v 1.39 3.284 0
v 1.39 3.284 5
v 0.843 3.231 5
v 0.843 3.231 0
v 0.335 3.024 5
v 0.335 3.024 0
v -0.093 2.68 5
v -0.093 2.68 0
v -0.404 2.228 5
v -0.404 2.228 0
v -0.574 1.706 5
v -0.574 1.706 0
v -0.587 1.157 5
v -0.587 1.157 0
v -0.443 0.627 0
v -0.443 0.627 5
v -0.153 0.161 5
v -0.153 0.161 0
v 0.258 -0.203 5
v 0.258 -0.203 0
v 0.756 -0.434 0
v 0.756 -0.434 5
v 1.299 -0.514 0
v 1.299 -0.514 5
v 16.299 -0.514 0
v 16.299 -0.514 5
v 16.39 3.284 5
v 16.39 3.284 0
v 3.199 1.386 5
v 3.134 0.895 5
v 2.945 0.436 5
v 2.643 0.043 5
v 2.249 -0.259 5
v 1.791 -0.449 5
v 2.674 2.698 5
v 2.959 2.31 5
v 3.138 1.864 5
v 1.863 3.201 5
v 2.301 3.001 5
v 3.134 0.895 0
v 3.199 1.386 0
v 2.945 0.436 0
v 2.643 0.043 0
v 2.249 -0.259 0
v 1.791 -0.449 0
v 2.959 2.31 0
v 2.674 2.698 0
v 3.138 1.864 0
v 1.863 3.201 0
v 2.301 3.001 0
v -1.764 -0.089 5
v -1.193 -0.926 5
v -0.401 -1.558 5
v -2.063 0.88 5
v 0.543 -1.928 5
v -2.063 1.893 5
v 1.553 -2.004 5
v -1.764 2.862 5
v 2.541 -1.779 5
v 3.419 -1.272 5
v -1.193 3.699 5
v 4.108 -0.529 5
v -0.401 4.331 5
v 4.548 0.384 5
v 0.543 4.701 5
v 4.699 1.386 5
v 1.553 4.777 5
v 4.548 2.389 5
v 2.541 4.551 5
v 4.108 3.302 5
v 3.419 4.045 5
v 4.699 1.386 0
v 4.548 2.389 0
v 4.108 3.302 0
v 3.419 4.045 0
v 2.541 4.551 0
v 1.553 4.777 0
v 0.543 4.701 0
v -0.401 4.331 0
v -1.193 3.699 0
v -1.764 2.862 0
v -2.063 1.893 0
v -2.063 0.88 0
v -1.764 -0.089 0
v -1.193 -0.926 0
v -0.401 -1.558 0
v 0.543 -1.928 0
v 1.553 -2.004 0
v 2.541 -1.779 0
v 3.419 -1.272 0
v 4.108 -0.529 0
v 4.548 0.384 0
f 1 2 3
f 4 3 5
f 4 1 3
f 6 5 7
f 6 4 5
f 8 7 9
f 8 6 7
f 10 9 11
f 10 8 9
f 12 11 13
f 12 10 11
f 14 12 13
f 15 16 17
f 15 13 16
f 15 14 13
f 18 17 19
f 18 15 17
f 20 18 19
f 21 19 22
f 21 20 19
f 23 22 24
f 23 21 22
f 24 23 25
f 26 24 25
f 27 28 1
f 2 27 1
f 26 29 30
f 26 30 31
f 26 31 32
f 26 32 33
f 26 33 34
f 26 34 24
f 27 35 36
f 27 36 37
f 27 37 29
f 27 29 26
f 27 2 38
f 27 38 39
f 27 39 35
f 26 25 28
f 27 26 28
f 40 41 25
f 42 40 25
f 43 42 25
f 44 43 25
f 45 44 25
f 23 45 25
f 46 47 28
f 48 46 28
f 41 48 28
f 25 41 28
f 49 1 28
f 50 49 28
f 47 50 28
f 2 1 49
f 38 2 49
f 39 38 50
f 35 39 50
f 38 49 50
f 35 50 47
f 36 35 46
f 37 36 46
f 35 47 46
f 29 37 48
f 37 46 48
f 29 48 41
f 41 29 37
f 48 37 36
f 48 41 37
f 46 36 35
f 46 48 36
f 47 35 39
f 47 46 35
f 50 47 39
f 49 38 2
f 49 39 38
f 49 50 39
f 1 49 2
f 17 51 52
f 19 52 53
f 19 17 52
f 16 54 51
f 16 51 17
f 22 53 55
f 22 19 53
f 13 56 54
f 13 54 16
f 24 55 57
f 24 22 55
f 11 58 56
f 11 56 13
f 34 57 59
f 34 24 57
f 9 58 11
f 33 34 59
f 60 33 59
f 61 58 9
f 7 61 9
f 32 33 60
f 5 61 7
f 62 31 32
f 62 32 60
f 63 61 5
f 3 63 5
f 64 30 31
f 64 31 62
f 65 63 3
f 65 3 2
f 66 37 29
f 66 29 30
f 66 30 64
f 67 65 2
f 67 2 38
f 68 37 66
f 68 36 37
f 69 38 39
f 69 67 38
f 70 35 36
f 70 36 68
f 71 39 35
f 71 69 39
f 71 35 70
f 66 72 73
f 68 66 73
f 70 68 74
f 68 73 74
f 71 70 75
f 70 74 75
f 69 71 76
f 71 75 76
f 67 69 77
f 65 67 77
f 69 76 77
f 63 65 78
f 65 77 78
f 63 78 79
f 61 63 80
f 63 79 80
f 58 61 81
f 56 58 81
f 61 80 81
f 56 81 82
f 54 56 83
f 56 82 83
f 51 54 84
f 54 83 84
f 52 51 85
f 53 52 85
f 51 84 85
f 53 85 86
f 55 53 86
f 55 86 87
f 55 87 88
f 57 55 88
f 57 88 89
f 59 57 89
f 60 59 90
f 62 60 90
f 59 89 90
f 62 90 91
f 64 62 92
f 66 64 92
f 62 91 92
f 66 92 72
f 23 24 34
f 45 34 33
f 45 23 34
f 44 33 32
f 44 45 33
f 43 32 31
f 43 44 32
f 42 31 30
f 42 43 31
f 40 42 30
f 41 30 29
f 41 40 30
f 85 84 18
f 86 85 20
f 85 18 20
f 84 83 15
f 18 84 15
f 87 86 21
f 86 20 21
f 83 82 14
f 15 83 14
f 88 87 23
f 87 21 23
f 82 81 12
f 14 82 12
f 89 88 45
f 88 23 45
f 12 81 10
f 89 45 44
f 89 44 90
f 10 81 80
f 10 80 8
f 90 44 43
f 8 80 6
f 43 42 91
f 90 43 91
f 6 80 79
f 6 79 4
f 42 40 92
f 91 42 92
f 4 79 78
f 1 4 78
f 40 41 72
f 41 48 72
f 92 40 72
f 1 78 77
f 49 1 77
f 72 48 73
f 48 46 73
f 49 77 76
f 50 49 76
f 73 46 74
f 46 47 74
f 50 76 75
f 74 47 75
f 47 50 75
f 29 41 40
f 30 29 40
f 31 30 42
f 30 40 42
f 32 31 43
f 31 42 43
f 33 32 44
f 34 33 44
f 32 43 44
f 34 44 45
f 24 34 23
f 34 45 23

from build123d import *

# Parameters (mm, degrees)
F1_R     = 3.4
F2_DEPTH = 5
F3_DEPTH = 25
F4_DEPTH = 5


with BuildPart() as f2:
    # F1 (on Top) → F2 (new body)
    with BuildSketch(Plane.XY):
        with Locations((1.299126, 1.38646)):
            Circle(F1_R)
    extrude(amount=F2_DEPTH)

    # F0 (on Top) → F3 (cut)
    with BuildSketch(Plane.XY):
        with BuildLine():
            ThreePointArc((1.299126, -0.51354), (2.642629, 0.042957), (3.199126, 1.38646))
            ThreePointArc((3.199126, 1.38646), (2.674243, 2.697587), (1.389596, 3.284305))
            ThreePointArc((1.389596, 3.284305), (-0.600335, 1.431708), (1.299126, -0.51354))
        make_face()
    extrude(amount=F3_DEPTH, mode=Mode.SUBTRACT)


with BuildPart() as f4:
    # F0 (on Top) → F4 (new body)
    with BuildSketch(Plane.XY):
        with BuildLine():
            ThreePointArc((1.389596, 3.284305), (2.674243, 2.697587), (3.199126, 1.38646))
            ThreePointArc((3.199126, 1.38646), (2.642629, 0.042957), (1.299126, -0.51354))
            Line((1.299126, -0.51354), (16.299126, -0.51354))
            Line((16.299126, -0.51354), (16.389596, 3.284305))
            Line((16.389596, 3.284305), (1.389596, 3.284305))
        make_face()
    extrude(amount=F4_DEPTH)


solid = Compound([f2.part, f4.part])
